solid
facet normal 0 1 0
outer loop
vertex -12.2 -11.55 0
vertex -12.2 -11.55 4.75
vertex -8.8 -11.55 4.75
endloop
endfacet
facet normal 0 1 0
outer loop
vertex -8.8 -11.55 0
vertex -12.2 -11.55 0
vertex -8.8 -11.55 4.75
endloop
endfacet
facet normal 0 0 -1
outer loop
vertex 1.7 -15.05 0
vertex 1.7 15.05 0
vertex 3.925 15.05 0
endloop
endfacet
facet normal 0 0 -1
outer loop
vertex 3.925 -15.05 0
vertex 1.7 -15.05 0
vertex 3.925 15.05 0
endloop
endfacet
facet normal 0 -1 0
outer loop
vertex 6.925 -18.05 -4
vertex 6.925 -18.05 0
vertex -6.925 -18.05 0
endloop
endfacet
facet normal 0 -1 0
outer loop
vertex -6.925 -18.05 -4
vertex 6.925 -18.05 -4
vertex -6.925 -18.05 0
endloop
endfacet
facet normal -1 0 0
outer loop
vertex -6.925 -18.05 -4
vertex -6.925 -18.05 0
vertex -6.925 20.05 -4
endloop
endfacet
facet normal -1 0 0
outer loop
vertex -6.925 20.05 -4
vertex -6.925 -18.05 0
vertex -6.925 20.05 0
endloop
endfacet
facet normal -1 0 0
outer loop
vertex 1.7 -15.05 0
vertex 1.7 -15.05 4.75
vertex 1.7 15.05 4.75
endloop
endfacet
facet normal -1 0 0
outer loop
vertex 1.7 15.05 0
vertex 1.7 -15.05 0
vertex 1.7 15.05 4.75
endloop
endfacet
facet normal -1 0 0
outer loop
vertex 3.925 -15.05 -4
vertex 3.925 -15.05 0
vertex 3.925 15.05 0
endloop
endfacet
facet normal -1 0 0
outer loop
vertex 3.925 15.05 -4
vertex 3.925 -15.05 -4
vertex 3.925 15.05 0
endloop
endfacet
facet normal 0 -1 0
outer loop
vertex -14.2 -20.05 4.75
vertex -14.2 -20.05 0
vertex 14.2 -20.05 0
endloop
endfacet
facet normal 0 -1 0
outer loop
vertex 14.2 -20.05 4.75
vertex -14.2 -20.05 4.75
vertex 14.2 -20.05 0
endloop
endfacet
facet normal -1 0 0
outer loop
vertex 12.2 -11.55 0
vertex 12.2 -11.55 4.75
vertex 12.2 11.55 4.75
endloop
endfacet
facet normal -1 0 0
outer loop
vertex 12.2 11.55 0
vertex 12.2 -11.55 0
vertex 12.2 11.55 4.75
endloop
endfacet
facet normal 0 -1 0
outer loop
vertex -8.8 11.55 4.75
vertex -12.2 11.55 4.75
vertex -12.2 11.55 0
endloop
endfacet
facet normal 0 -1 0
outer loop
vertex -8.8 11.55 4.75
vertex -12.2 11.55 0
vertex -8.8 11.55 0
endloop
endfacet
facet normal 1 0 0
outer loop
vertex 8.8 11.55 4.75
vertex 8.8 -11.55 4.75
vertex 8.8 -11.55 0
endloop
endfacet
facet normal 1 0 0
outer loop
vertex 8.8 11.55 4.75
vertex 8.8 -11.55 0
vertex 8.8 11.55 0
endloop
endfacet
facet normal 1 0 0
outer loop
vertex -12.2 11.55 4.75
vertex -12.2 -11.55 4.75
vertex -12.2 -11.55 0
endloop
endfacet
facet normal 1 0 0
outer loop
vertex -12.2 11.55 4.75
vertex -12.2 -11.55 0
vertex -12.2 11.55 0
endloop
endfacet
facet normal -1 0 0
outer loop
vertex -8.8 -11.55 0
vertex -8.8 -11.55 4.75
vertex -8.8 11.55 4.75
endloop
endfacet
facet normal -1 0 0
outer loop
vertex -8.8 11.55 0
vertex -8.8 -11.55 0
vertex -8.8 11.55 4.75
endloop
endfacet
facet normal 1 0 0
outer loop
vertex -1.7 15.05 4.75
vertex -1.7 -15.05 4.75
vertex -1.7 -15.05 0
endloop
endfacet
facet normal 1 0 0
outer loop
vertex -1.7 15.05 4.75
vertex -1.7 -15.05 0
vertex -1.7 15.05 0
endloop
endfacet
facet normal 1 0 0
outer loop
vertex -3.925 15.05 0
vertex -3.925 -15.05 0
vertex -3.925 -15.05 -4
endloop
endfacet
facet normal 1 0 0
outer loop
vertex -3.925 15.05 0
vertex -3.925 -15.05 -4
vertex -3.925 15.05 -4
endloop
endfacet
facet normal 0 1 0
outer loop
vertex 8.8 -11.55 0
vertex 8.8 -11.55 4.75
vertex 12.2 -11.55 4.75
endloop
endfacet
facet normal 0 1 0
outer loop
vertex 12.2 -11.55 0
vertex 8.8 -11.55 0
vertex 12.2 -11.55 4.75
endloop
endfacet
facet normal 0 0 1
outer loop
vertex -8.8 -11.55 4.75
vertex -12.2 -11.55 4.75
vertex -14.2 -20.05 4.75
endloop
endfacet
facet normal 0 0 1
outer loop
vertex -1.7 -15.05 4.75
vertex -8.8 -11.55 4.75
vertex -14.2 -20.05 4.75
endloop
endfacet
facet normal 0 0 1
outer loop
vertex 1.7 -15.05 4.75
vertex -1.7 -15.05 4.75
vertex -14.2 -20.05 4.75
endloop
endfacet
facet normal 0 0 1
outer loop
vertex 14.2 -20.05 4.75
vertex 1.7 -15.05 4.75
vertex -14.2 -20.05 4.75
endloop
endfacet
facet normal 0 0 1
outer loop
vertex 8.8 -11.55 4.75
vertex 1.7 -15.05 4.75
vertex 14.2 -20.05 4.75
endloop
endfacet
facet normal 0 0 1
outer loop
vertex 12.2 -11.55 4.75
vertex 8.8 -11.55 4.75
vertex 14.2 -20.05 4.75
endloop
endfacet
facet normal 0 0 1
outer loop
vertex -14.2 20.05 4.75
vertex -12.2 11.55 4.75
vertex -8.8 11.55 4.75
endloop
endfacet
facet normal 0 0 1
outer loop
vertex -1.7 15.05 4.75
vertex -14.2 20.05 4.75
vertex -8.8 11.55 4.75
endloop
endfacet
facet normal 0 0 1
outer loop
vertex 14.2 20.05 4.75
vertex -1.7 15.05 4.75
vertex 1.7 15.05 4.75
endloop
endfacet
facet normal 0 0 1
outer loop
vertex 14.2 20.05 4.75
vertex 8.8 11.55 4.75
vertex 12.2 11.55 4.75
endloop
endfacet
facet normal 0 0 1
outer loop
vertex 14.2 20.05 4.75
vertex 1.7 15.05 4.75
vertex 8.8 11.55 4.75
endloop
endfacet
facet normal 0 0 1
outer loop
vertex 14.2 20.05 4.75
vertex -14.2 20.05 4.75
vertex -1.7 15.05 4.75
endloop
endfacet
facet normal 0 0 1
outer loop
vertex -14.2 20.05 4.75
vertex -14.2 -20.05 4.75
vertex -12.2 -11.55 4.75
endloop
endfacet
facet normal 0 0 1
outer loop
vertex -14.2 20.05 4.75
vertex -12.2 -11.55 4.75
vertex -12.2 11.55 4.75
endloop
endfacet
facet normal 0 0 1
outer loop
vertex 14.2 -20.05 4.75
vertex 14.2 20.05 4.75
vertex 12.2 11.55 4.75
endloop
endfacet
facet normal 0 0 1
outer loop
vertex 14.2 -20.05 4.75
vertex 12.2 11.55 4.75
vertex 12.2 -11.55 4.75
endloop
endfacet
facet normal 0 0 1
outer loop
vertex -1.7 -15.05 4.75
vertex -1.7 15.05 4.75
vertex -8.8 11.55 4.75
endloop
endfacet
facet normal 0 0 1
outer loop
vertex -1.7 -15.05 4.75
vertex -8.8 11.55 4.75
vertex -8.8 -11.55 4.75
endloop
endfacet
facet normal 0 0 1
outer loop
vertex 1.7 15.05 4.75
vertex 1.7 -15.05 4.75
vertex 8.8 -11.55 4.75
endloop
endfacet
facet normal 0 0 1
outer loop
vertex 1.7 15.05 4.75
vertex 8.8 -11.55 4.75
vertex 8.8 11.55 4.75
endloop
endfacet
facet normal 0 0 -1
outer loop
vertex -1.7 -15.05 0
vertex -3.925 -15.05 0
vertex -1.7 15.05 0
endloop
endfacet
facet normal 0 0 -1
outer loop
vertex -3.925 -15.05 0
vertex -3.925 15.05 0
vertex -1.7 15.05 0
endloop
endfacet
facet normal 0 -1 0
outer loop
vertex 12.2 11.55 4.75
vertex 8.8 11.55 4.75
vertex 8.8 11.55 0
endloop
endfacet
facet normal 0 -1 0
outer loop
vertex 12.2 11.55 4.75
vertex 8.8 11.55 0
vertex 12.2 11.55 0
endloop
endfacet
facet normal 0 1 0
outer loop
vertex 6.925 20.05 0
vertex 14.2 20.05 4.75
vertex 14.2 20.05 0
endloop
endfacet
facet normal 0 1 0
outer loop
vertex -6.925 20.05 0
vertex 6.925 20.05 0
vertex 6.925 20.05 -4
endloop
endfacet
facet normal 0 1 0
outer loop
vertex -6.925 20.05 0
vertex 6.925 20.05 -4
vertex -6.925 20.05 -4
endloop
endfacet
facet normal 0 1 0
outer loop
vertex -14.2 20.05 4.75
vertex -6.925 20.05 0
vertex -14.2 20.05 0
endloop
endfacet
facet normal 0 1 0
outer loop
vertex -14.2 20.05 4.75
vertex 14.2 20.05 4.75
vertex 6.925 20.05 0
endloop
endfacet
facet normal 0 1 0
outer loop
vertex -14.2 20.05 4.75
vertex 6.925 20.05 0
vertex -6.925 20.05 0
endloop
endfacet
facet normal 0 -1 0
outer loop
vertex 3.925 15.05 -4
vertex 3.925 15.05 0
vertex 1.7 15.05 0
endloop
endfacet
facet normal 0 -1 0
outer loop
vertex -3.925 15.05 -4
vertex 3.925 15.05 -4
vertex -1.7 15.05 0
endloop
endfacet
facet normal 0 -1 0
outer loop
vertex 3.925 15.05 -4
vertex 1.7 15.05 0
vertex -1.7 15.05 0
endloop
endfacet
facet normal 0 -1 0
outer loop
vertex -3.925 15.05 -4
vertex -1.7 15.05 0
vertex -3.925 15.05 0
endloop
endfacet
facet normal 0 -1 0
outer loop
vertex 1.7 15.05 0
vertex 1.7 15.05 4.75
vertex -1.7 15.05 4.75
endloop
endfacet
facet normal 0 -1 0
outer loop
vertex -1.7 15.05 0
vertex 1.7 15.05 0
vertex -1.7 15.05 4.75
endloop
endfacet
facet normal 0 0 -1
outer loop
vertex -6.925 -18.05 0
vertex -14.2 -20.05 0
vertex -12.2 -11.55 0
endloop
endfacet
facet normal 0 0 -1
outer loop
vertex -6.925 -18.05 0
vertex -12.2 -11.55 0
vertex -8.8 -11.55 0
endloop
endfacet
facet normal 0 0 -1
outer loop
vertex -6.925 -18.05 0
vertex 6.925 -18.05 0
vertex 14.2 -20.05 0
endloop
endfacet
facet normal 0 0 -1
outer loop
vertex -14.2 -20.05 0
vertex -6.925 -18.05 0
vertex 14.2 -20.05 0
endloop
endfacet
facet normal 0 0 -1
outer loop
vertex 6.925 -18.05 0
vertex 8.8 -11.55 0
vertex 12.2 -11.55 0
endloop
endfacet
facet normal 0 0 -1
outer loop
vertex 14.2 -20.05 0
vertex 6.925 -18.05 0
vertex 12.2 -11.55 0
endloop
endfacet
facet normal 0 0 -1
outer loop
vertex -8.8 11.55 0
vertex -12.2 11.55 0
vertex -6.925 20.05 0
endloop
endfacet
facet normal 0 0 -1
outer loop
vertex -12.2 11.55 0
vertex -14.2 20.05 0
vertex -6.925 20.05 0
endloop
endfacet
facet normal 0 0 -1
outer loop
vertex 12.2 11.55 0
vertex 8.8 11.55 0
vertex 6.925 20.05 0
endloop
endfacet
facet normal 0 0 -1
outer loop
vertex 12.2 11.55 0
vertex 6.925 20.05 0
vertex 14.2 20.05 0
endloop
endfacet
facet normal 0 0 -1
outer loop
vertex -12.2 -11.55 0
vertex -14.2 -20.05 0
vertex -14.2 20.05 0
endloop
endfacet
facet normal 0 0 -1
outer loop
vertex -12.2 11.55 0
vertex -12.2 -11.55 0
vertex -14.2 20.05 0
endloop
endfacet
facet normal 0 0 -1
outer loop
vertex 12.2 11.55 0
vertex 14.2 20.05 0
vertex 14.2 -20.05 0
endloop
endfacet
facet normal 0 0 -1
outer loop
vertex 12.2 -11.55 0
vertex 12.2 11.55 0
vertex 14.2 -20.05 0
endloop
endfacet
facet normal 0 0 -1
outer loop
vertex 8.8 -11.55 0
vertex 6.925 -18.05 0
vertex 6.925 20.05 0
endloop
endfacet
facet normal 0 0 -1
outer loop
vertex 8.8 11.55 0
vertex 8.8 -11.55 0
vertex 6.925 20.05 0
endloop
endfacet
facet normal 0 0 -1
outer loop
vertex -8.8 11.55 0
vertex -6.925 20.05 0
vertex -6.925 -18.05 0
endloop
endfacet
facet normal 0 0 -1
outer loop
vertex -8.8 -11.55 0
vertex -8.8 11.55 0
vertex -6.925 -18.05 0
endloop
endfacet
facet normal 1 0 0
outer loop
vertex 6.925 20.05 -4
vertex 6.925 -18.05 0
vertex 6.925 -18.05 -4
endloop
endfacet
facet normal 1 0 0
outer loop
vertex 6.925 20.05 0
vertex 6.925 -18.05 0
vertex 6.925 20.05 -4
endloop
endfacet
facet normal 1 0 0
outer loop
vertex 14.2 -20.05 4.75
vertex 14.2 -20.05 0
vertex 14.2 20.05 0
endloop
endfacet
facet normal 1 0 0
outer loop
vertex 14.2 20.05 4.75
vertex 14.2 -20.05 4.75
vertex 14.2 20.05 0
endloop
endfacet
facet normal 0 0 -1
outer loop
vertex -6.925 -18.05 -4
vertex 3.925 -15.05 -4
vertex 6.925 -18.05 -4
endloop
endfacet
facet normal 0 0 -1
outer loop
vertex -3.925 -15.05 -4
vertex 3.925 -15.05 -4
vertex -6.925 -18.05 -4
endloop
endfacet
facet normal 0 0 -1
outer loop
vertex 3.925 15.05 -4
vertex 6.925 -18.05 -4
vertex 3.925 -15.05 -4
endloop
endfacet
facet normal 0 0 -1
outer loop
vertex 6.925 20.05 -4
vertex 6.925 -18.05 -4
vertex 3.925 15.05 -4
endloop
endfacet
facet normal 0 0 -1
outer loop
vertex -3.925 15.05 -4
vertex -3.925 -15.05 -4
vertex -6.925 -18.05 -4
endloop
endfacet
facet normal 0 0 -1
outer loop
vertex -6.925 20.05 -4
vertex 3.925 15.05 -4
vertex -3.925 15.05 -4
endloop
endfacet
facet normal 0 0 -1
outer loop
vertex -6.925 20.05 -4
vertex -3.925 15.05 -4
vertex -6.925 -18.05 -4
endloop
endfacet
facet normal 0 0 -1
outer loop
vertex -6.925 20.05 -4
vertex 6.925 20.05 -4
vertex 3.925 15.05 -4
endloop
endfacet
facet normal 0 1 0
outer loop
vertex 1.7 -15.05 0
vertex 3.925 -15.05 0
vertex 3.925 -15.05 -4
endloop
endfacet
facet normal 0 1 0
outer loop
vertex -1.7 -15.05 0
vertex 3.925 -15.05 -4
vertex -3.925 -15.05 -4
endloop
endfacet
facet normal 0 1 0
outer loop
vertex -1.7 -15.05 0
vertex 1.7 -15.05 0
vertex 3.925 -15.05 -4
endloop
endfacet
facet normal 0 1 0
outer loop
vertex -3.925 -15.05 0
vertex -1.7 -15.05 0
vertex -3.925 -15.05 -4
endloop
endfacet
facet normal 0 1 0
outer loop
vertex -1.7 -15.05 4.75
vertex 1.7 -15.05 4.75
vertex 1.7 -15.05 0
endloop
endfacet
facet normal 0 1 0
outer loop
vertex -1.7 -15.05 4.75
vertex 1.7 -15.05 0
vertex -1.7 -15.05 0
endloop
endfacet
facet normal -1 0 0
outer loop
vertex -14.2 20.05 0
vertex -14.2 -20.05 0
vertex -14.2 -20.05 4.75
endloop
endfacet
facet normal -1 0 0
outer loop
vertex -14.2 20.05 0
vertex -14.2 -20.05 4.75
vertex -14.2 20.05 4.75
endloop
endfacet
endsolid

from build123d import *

# Parameters (mm, degrees)
SKETCH1_W           = 28.4
SKETCH1_H           = 40.1
BOSS_EXTRUDE1_DEPTH = 4.75
SKETCH2_W           = 3.4
SKETCH2_H           = 23.1
SKETCH2_H_2         = 30.1
CUT_EXTRUDE1_DEPTH  = 26.024088395
SKETCH4_W           = 13.85
SKETCH4_H           = 38.1
SKETCH4_W_2         = 7.85
SKETCH4_H_2         = 30.1
BOSS_EXTRUDE2_DEPTH = 4


with BuildPart() as part:
    # Sketch1 → Boss-Extrude1 (new body)
    with BuildSketch(Plane.XY):
        Rectangle(SKETCH1_W, SKETCH1_H)
    extrude(amount=BOSS_EXTRUDE1_DEPTH)

    # Sketch2 → Cut-Extrude1 (cut, through all)
    with BuildSketch(Plane.XY.offset(4.75)):
        with Locations((10.5, 0)):
            Rectangle(SKETCH2_W, SKETCH2_H)
        with Locations((-10.5, 0)):
            Rectangle(SKETCH2_W, SKETCH2_H)
        Rectangle(SKETCH2_W, SKETCH2_H_2)
    extrude(amount=-CUT_EXTRUDE1_DEPTH, mode=Mode.SUBTRACT)

    # Sketch4 → Boss-Extrude2 (add)
    with BuildSketch(Plane(origin=(0, 0, 0), x_dir=(-1, 0, 0), z_dir=(0, 0, -1))):
        with Locations((0, 1)):
            Rectangle(SKETCH4_W, SKETCH4_H)
        Rectangle(SKETCH4_W_2, SKETCH4_H_2, mode=Mode.SUBTRACT)
    extrude(amount=BOSS_EXTRUDE2_DEPTH)


solid = part.part
